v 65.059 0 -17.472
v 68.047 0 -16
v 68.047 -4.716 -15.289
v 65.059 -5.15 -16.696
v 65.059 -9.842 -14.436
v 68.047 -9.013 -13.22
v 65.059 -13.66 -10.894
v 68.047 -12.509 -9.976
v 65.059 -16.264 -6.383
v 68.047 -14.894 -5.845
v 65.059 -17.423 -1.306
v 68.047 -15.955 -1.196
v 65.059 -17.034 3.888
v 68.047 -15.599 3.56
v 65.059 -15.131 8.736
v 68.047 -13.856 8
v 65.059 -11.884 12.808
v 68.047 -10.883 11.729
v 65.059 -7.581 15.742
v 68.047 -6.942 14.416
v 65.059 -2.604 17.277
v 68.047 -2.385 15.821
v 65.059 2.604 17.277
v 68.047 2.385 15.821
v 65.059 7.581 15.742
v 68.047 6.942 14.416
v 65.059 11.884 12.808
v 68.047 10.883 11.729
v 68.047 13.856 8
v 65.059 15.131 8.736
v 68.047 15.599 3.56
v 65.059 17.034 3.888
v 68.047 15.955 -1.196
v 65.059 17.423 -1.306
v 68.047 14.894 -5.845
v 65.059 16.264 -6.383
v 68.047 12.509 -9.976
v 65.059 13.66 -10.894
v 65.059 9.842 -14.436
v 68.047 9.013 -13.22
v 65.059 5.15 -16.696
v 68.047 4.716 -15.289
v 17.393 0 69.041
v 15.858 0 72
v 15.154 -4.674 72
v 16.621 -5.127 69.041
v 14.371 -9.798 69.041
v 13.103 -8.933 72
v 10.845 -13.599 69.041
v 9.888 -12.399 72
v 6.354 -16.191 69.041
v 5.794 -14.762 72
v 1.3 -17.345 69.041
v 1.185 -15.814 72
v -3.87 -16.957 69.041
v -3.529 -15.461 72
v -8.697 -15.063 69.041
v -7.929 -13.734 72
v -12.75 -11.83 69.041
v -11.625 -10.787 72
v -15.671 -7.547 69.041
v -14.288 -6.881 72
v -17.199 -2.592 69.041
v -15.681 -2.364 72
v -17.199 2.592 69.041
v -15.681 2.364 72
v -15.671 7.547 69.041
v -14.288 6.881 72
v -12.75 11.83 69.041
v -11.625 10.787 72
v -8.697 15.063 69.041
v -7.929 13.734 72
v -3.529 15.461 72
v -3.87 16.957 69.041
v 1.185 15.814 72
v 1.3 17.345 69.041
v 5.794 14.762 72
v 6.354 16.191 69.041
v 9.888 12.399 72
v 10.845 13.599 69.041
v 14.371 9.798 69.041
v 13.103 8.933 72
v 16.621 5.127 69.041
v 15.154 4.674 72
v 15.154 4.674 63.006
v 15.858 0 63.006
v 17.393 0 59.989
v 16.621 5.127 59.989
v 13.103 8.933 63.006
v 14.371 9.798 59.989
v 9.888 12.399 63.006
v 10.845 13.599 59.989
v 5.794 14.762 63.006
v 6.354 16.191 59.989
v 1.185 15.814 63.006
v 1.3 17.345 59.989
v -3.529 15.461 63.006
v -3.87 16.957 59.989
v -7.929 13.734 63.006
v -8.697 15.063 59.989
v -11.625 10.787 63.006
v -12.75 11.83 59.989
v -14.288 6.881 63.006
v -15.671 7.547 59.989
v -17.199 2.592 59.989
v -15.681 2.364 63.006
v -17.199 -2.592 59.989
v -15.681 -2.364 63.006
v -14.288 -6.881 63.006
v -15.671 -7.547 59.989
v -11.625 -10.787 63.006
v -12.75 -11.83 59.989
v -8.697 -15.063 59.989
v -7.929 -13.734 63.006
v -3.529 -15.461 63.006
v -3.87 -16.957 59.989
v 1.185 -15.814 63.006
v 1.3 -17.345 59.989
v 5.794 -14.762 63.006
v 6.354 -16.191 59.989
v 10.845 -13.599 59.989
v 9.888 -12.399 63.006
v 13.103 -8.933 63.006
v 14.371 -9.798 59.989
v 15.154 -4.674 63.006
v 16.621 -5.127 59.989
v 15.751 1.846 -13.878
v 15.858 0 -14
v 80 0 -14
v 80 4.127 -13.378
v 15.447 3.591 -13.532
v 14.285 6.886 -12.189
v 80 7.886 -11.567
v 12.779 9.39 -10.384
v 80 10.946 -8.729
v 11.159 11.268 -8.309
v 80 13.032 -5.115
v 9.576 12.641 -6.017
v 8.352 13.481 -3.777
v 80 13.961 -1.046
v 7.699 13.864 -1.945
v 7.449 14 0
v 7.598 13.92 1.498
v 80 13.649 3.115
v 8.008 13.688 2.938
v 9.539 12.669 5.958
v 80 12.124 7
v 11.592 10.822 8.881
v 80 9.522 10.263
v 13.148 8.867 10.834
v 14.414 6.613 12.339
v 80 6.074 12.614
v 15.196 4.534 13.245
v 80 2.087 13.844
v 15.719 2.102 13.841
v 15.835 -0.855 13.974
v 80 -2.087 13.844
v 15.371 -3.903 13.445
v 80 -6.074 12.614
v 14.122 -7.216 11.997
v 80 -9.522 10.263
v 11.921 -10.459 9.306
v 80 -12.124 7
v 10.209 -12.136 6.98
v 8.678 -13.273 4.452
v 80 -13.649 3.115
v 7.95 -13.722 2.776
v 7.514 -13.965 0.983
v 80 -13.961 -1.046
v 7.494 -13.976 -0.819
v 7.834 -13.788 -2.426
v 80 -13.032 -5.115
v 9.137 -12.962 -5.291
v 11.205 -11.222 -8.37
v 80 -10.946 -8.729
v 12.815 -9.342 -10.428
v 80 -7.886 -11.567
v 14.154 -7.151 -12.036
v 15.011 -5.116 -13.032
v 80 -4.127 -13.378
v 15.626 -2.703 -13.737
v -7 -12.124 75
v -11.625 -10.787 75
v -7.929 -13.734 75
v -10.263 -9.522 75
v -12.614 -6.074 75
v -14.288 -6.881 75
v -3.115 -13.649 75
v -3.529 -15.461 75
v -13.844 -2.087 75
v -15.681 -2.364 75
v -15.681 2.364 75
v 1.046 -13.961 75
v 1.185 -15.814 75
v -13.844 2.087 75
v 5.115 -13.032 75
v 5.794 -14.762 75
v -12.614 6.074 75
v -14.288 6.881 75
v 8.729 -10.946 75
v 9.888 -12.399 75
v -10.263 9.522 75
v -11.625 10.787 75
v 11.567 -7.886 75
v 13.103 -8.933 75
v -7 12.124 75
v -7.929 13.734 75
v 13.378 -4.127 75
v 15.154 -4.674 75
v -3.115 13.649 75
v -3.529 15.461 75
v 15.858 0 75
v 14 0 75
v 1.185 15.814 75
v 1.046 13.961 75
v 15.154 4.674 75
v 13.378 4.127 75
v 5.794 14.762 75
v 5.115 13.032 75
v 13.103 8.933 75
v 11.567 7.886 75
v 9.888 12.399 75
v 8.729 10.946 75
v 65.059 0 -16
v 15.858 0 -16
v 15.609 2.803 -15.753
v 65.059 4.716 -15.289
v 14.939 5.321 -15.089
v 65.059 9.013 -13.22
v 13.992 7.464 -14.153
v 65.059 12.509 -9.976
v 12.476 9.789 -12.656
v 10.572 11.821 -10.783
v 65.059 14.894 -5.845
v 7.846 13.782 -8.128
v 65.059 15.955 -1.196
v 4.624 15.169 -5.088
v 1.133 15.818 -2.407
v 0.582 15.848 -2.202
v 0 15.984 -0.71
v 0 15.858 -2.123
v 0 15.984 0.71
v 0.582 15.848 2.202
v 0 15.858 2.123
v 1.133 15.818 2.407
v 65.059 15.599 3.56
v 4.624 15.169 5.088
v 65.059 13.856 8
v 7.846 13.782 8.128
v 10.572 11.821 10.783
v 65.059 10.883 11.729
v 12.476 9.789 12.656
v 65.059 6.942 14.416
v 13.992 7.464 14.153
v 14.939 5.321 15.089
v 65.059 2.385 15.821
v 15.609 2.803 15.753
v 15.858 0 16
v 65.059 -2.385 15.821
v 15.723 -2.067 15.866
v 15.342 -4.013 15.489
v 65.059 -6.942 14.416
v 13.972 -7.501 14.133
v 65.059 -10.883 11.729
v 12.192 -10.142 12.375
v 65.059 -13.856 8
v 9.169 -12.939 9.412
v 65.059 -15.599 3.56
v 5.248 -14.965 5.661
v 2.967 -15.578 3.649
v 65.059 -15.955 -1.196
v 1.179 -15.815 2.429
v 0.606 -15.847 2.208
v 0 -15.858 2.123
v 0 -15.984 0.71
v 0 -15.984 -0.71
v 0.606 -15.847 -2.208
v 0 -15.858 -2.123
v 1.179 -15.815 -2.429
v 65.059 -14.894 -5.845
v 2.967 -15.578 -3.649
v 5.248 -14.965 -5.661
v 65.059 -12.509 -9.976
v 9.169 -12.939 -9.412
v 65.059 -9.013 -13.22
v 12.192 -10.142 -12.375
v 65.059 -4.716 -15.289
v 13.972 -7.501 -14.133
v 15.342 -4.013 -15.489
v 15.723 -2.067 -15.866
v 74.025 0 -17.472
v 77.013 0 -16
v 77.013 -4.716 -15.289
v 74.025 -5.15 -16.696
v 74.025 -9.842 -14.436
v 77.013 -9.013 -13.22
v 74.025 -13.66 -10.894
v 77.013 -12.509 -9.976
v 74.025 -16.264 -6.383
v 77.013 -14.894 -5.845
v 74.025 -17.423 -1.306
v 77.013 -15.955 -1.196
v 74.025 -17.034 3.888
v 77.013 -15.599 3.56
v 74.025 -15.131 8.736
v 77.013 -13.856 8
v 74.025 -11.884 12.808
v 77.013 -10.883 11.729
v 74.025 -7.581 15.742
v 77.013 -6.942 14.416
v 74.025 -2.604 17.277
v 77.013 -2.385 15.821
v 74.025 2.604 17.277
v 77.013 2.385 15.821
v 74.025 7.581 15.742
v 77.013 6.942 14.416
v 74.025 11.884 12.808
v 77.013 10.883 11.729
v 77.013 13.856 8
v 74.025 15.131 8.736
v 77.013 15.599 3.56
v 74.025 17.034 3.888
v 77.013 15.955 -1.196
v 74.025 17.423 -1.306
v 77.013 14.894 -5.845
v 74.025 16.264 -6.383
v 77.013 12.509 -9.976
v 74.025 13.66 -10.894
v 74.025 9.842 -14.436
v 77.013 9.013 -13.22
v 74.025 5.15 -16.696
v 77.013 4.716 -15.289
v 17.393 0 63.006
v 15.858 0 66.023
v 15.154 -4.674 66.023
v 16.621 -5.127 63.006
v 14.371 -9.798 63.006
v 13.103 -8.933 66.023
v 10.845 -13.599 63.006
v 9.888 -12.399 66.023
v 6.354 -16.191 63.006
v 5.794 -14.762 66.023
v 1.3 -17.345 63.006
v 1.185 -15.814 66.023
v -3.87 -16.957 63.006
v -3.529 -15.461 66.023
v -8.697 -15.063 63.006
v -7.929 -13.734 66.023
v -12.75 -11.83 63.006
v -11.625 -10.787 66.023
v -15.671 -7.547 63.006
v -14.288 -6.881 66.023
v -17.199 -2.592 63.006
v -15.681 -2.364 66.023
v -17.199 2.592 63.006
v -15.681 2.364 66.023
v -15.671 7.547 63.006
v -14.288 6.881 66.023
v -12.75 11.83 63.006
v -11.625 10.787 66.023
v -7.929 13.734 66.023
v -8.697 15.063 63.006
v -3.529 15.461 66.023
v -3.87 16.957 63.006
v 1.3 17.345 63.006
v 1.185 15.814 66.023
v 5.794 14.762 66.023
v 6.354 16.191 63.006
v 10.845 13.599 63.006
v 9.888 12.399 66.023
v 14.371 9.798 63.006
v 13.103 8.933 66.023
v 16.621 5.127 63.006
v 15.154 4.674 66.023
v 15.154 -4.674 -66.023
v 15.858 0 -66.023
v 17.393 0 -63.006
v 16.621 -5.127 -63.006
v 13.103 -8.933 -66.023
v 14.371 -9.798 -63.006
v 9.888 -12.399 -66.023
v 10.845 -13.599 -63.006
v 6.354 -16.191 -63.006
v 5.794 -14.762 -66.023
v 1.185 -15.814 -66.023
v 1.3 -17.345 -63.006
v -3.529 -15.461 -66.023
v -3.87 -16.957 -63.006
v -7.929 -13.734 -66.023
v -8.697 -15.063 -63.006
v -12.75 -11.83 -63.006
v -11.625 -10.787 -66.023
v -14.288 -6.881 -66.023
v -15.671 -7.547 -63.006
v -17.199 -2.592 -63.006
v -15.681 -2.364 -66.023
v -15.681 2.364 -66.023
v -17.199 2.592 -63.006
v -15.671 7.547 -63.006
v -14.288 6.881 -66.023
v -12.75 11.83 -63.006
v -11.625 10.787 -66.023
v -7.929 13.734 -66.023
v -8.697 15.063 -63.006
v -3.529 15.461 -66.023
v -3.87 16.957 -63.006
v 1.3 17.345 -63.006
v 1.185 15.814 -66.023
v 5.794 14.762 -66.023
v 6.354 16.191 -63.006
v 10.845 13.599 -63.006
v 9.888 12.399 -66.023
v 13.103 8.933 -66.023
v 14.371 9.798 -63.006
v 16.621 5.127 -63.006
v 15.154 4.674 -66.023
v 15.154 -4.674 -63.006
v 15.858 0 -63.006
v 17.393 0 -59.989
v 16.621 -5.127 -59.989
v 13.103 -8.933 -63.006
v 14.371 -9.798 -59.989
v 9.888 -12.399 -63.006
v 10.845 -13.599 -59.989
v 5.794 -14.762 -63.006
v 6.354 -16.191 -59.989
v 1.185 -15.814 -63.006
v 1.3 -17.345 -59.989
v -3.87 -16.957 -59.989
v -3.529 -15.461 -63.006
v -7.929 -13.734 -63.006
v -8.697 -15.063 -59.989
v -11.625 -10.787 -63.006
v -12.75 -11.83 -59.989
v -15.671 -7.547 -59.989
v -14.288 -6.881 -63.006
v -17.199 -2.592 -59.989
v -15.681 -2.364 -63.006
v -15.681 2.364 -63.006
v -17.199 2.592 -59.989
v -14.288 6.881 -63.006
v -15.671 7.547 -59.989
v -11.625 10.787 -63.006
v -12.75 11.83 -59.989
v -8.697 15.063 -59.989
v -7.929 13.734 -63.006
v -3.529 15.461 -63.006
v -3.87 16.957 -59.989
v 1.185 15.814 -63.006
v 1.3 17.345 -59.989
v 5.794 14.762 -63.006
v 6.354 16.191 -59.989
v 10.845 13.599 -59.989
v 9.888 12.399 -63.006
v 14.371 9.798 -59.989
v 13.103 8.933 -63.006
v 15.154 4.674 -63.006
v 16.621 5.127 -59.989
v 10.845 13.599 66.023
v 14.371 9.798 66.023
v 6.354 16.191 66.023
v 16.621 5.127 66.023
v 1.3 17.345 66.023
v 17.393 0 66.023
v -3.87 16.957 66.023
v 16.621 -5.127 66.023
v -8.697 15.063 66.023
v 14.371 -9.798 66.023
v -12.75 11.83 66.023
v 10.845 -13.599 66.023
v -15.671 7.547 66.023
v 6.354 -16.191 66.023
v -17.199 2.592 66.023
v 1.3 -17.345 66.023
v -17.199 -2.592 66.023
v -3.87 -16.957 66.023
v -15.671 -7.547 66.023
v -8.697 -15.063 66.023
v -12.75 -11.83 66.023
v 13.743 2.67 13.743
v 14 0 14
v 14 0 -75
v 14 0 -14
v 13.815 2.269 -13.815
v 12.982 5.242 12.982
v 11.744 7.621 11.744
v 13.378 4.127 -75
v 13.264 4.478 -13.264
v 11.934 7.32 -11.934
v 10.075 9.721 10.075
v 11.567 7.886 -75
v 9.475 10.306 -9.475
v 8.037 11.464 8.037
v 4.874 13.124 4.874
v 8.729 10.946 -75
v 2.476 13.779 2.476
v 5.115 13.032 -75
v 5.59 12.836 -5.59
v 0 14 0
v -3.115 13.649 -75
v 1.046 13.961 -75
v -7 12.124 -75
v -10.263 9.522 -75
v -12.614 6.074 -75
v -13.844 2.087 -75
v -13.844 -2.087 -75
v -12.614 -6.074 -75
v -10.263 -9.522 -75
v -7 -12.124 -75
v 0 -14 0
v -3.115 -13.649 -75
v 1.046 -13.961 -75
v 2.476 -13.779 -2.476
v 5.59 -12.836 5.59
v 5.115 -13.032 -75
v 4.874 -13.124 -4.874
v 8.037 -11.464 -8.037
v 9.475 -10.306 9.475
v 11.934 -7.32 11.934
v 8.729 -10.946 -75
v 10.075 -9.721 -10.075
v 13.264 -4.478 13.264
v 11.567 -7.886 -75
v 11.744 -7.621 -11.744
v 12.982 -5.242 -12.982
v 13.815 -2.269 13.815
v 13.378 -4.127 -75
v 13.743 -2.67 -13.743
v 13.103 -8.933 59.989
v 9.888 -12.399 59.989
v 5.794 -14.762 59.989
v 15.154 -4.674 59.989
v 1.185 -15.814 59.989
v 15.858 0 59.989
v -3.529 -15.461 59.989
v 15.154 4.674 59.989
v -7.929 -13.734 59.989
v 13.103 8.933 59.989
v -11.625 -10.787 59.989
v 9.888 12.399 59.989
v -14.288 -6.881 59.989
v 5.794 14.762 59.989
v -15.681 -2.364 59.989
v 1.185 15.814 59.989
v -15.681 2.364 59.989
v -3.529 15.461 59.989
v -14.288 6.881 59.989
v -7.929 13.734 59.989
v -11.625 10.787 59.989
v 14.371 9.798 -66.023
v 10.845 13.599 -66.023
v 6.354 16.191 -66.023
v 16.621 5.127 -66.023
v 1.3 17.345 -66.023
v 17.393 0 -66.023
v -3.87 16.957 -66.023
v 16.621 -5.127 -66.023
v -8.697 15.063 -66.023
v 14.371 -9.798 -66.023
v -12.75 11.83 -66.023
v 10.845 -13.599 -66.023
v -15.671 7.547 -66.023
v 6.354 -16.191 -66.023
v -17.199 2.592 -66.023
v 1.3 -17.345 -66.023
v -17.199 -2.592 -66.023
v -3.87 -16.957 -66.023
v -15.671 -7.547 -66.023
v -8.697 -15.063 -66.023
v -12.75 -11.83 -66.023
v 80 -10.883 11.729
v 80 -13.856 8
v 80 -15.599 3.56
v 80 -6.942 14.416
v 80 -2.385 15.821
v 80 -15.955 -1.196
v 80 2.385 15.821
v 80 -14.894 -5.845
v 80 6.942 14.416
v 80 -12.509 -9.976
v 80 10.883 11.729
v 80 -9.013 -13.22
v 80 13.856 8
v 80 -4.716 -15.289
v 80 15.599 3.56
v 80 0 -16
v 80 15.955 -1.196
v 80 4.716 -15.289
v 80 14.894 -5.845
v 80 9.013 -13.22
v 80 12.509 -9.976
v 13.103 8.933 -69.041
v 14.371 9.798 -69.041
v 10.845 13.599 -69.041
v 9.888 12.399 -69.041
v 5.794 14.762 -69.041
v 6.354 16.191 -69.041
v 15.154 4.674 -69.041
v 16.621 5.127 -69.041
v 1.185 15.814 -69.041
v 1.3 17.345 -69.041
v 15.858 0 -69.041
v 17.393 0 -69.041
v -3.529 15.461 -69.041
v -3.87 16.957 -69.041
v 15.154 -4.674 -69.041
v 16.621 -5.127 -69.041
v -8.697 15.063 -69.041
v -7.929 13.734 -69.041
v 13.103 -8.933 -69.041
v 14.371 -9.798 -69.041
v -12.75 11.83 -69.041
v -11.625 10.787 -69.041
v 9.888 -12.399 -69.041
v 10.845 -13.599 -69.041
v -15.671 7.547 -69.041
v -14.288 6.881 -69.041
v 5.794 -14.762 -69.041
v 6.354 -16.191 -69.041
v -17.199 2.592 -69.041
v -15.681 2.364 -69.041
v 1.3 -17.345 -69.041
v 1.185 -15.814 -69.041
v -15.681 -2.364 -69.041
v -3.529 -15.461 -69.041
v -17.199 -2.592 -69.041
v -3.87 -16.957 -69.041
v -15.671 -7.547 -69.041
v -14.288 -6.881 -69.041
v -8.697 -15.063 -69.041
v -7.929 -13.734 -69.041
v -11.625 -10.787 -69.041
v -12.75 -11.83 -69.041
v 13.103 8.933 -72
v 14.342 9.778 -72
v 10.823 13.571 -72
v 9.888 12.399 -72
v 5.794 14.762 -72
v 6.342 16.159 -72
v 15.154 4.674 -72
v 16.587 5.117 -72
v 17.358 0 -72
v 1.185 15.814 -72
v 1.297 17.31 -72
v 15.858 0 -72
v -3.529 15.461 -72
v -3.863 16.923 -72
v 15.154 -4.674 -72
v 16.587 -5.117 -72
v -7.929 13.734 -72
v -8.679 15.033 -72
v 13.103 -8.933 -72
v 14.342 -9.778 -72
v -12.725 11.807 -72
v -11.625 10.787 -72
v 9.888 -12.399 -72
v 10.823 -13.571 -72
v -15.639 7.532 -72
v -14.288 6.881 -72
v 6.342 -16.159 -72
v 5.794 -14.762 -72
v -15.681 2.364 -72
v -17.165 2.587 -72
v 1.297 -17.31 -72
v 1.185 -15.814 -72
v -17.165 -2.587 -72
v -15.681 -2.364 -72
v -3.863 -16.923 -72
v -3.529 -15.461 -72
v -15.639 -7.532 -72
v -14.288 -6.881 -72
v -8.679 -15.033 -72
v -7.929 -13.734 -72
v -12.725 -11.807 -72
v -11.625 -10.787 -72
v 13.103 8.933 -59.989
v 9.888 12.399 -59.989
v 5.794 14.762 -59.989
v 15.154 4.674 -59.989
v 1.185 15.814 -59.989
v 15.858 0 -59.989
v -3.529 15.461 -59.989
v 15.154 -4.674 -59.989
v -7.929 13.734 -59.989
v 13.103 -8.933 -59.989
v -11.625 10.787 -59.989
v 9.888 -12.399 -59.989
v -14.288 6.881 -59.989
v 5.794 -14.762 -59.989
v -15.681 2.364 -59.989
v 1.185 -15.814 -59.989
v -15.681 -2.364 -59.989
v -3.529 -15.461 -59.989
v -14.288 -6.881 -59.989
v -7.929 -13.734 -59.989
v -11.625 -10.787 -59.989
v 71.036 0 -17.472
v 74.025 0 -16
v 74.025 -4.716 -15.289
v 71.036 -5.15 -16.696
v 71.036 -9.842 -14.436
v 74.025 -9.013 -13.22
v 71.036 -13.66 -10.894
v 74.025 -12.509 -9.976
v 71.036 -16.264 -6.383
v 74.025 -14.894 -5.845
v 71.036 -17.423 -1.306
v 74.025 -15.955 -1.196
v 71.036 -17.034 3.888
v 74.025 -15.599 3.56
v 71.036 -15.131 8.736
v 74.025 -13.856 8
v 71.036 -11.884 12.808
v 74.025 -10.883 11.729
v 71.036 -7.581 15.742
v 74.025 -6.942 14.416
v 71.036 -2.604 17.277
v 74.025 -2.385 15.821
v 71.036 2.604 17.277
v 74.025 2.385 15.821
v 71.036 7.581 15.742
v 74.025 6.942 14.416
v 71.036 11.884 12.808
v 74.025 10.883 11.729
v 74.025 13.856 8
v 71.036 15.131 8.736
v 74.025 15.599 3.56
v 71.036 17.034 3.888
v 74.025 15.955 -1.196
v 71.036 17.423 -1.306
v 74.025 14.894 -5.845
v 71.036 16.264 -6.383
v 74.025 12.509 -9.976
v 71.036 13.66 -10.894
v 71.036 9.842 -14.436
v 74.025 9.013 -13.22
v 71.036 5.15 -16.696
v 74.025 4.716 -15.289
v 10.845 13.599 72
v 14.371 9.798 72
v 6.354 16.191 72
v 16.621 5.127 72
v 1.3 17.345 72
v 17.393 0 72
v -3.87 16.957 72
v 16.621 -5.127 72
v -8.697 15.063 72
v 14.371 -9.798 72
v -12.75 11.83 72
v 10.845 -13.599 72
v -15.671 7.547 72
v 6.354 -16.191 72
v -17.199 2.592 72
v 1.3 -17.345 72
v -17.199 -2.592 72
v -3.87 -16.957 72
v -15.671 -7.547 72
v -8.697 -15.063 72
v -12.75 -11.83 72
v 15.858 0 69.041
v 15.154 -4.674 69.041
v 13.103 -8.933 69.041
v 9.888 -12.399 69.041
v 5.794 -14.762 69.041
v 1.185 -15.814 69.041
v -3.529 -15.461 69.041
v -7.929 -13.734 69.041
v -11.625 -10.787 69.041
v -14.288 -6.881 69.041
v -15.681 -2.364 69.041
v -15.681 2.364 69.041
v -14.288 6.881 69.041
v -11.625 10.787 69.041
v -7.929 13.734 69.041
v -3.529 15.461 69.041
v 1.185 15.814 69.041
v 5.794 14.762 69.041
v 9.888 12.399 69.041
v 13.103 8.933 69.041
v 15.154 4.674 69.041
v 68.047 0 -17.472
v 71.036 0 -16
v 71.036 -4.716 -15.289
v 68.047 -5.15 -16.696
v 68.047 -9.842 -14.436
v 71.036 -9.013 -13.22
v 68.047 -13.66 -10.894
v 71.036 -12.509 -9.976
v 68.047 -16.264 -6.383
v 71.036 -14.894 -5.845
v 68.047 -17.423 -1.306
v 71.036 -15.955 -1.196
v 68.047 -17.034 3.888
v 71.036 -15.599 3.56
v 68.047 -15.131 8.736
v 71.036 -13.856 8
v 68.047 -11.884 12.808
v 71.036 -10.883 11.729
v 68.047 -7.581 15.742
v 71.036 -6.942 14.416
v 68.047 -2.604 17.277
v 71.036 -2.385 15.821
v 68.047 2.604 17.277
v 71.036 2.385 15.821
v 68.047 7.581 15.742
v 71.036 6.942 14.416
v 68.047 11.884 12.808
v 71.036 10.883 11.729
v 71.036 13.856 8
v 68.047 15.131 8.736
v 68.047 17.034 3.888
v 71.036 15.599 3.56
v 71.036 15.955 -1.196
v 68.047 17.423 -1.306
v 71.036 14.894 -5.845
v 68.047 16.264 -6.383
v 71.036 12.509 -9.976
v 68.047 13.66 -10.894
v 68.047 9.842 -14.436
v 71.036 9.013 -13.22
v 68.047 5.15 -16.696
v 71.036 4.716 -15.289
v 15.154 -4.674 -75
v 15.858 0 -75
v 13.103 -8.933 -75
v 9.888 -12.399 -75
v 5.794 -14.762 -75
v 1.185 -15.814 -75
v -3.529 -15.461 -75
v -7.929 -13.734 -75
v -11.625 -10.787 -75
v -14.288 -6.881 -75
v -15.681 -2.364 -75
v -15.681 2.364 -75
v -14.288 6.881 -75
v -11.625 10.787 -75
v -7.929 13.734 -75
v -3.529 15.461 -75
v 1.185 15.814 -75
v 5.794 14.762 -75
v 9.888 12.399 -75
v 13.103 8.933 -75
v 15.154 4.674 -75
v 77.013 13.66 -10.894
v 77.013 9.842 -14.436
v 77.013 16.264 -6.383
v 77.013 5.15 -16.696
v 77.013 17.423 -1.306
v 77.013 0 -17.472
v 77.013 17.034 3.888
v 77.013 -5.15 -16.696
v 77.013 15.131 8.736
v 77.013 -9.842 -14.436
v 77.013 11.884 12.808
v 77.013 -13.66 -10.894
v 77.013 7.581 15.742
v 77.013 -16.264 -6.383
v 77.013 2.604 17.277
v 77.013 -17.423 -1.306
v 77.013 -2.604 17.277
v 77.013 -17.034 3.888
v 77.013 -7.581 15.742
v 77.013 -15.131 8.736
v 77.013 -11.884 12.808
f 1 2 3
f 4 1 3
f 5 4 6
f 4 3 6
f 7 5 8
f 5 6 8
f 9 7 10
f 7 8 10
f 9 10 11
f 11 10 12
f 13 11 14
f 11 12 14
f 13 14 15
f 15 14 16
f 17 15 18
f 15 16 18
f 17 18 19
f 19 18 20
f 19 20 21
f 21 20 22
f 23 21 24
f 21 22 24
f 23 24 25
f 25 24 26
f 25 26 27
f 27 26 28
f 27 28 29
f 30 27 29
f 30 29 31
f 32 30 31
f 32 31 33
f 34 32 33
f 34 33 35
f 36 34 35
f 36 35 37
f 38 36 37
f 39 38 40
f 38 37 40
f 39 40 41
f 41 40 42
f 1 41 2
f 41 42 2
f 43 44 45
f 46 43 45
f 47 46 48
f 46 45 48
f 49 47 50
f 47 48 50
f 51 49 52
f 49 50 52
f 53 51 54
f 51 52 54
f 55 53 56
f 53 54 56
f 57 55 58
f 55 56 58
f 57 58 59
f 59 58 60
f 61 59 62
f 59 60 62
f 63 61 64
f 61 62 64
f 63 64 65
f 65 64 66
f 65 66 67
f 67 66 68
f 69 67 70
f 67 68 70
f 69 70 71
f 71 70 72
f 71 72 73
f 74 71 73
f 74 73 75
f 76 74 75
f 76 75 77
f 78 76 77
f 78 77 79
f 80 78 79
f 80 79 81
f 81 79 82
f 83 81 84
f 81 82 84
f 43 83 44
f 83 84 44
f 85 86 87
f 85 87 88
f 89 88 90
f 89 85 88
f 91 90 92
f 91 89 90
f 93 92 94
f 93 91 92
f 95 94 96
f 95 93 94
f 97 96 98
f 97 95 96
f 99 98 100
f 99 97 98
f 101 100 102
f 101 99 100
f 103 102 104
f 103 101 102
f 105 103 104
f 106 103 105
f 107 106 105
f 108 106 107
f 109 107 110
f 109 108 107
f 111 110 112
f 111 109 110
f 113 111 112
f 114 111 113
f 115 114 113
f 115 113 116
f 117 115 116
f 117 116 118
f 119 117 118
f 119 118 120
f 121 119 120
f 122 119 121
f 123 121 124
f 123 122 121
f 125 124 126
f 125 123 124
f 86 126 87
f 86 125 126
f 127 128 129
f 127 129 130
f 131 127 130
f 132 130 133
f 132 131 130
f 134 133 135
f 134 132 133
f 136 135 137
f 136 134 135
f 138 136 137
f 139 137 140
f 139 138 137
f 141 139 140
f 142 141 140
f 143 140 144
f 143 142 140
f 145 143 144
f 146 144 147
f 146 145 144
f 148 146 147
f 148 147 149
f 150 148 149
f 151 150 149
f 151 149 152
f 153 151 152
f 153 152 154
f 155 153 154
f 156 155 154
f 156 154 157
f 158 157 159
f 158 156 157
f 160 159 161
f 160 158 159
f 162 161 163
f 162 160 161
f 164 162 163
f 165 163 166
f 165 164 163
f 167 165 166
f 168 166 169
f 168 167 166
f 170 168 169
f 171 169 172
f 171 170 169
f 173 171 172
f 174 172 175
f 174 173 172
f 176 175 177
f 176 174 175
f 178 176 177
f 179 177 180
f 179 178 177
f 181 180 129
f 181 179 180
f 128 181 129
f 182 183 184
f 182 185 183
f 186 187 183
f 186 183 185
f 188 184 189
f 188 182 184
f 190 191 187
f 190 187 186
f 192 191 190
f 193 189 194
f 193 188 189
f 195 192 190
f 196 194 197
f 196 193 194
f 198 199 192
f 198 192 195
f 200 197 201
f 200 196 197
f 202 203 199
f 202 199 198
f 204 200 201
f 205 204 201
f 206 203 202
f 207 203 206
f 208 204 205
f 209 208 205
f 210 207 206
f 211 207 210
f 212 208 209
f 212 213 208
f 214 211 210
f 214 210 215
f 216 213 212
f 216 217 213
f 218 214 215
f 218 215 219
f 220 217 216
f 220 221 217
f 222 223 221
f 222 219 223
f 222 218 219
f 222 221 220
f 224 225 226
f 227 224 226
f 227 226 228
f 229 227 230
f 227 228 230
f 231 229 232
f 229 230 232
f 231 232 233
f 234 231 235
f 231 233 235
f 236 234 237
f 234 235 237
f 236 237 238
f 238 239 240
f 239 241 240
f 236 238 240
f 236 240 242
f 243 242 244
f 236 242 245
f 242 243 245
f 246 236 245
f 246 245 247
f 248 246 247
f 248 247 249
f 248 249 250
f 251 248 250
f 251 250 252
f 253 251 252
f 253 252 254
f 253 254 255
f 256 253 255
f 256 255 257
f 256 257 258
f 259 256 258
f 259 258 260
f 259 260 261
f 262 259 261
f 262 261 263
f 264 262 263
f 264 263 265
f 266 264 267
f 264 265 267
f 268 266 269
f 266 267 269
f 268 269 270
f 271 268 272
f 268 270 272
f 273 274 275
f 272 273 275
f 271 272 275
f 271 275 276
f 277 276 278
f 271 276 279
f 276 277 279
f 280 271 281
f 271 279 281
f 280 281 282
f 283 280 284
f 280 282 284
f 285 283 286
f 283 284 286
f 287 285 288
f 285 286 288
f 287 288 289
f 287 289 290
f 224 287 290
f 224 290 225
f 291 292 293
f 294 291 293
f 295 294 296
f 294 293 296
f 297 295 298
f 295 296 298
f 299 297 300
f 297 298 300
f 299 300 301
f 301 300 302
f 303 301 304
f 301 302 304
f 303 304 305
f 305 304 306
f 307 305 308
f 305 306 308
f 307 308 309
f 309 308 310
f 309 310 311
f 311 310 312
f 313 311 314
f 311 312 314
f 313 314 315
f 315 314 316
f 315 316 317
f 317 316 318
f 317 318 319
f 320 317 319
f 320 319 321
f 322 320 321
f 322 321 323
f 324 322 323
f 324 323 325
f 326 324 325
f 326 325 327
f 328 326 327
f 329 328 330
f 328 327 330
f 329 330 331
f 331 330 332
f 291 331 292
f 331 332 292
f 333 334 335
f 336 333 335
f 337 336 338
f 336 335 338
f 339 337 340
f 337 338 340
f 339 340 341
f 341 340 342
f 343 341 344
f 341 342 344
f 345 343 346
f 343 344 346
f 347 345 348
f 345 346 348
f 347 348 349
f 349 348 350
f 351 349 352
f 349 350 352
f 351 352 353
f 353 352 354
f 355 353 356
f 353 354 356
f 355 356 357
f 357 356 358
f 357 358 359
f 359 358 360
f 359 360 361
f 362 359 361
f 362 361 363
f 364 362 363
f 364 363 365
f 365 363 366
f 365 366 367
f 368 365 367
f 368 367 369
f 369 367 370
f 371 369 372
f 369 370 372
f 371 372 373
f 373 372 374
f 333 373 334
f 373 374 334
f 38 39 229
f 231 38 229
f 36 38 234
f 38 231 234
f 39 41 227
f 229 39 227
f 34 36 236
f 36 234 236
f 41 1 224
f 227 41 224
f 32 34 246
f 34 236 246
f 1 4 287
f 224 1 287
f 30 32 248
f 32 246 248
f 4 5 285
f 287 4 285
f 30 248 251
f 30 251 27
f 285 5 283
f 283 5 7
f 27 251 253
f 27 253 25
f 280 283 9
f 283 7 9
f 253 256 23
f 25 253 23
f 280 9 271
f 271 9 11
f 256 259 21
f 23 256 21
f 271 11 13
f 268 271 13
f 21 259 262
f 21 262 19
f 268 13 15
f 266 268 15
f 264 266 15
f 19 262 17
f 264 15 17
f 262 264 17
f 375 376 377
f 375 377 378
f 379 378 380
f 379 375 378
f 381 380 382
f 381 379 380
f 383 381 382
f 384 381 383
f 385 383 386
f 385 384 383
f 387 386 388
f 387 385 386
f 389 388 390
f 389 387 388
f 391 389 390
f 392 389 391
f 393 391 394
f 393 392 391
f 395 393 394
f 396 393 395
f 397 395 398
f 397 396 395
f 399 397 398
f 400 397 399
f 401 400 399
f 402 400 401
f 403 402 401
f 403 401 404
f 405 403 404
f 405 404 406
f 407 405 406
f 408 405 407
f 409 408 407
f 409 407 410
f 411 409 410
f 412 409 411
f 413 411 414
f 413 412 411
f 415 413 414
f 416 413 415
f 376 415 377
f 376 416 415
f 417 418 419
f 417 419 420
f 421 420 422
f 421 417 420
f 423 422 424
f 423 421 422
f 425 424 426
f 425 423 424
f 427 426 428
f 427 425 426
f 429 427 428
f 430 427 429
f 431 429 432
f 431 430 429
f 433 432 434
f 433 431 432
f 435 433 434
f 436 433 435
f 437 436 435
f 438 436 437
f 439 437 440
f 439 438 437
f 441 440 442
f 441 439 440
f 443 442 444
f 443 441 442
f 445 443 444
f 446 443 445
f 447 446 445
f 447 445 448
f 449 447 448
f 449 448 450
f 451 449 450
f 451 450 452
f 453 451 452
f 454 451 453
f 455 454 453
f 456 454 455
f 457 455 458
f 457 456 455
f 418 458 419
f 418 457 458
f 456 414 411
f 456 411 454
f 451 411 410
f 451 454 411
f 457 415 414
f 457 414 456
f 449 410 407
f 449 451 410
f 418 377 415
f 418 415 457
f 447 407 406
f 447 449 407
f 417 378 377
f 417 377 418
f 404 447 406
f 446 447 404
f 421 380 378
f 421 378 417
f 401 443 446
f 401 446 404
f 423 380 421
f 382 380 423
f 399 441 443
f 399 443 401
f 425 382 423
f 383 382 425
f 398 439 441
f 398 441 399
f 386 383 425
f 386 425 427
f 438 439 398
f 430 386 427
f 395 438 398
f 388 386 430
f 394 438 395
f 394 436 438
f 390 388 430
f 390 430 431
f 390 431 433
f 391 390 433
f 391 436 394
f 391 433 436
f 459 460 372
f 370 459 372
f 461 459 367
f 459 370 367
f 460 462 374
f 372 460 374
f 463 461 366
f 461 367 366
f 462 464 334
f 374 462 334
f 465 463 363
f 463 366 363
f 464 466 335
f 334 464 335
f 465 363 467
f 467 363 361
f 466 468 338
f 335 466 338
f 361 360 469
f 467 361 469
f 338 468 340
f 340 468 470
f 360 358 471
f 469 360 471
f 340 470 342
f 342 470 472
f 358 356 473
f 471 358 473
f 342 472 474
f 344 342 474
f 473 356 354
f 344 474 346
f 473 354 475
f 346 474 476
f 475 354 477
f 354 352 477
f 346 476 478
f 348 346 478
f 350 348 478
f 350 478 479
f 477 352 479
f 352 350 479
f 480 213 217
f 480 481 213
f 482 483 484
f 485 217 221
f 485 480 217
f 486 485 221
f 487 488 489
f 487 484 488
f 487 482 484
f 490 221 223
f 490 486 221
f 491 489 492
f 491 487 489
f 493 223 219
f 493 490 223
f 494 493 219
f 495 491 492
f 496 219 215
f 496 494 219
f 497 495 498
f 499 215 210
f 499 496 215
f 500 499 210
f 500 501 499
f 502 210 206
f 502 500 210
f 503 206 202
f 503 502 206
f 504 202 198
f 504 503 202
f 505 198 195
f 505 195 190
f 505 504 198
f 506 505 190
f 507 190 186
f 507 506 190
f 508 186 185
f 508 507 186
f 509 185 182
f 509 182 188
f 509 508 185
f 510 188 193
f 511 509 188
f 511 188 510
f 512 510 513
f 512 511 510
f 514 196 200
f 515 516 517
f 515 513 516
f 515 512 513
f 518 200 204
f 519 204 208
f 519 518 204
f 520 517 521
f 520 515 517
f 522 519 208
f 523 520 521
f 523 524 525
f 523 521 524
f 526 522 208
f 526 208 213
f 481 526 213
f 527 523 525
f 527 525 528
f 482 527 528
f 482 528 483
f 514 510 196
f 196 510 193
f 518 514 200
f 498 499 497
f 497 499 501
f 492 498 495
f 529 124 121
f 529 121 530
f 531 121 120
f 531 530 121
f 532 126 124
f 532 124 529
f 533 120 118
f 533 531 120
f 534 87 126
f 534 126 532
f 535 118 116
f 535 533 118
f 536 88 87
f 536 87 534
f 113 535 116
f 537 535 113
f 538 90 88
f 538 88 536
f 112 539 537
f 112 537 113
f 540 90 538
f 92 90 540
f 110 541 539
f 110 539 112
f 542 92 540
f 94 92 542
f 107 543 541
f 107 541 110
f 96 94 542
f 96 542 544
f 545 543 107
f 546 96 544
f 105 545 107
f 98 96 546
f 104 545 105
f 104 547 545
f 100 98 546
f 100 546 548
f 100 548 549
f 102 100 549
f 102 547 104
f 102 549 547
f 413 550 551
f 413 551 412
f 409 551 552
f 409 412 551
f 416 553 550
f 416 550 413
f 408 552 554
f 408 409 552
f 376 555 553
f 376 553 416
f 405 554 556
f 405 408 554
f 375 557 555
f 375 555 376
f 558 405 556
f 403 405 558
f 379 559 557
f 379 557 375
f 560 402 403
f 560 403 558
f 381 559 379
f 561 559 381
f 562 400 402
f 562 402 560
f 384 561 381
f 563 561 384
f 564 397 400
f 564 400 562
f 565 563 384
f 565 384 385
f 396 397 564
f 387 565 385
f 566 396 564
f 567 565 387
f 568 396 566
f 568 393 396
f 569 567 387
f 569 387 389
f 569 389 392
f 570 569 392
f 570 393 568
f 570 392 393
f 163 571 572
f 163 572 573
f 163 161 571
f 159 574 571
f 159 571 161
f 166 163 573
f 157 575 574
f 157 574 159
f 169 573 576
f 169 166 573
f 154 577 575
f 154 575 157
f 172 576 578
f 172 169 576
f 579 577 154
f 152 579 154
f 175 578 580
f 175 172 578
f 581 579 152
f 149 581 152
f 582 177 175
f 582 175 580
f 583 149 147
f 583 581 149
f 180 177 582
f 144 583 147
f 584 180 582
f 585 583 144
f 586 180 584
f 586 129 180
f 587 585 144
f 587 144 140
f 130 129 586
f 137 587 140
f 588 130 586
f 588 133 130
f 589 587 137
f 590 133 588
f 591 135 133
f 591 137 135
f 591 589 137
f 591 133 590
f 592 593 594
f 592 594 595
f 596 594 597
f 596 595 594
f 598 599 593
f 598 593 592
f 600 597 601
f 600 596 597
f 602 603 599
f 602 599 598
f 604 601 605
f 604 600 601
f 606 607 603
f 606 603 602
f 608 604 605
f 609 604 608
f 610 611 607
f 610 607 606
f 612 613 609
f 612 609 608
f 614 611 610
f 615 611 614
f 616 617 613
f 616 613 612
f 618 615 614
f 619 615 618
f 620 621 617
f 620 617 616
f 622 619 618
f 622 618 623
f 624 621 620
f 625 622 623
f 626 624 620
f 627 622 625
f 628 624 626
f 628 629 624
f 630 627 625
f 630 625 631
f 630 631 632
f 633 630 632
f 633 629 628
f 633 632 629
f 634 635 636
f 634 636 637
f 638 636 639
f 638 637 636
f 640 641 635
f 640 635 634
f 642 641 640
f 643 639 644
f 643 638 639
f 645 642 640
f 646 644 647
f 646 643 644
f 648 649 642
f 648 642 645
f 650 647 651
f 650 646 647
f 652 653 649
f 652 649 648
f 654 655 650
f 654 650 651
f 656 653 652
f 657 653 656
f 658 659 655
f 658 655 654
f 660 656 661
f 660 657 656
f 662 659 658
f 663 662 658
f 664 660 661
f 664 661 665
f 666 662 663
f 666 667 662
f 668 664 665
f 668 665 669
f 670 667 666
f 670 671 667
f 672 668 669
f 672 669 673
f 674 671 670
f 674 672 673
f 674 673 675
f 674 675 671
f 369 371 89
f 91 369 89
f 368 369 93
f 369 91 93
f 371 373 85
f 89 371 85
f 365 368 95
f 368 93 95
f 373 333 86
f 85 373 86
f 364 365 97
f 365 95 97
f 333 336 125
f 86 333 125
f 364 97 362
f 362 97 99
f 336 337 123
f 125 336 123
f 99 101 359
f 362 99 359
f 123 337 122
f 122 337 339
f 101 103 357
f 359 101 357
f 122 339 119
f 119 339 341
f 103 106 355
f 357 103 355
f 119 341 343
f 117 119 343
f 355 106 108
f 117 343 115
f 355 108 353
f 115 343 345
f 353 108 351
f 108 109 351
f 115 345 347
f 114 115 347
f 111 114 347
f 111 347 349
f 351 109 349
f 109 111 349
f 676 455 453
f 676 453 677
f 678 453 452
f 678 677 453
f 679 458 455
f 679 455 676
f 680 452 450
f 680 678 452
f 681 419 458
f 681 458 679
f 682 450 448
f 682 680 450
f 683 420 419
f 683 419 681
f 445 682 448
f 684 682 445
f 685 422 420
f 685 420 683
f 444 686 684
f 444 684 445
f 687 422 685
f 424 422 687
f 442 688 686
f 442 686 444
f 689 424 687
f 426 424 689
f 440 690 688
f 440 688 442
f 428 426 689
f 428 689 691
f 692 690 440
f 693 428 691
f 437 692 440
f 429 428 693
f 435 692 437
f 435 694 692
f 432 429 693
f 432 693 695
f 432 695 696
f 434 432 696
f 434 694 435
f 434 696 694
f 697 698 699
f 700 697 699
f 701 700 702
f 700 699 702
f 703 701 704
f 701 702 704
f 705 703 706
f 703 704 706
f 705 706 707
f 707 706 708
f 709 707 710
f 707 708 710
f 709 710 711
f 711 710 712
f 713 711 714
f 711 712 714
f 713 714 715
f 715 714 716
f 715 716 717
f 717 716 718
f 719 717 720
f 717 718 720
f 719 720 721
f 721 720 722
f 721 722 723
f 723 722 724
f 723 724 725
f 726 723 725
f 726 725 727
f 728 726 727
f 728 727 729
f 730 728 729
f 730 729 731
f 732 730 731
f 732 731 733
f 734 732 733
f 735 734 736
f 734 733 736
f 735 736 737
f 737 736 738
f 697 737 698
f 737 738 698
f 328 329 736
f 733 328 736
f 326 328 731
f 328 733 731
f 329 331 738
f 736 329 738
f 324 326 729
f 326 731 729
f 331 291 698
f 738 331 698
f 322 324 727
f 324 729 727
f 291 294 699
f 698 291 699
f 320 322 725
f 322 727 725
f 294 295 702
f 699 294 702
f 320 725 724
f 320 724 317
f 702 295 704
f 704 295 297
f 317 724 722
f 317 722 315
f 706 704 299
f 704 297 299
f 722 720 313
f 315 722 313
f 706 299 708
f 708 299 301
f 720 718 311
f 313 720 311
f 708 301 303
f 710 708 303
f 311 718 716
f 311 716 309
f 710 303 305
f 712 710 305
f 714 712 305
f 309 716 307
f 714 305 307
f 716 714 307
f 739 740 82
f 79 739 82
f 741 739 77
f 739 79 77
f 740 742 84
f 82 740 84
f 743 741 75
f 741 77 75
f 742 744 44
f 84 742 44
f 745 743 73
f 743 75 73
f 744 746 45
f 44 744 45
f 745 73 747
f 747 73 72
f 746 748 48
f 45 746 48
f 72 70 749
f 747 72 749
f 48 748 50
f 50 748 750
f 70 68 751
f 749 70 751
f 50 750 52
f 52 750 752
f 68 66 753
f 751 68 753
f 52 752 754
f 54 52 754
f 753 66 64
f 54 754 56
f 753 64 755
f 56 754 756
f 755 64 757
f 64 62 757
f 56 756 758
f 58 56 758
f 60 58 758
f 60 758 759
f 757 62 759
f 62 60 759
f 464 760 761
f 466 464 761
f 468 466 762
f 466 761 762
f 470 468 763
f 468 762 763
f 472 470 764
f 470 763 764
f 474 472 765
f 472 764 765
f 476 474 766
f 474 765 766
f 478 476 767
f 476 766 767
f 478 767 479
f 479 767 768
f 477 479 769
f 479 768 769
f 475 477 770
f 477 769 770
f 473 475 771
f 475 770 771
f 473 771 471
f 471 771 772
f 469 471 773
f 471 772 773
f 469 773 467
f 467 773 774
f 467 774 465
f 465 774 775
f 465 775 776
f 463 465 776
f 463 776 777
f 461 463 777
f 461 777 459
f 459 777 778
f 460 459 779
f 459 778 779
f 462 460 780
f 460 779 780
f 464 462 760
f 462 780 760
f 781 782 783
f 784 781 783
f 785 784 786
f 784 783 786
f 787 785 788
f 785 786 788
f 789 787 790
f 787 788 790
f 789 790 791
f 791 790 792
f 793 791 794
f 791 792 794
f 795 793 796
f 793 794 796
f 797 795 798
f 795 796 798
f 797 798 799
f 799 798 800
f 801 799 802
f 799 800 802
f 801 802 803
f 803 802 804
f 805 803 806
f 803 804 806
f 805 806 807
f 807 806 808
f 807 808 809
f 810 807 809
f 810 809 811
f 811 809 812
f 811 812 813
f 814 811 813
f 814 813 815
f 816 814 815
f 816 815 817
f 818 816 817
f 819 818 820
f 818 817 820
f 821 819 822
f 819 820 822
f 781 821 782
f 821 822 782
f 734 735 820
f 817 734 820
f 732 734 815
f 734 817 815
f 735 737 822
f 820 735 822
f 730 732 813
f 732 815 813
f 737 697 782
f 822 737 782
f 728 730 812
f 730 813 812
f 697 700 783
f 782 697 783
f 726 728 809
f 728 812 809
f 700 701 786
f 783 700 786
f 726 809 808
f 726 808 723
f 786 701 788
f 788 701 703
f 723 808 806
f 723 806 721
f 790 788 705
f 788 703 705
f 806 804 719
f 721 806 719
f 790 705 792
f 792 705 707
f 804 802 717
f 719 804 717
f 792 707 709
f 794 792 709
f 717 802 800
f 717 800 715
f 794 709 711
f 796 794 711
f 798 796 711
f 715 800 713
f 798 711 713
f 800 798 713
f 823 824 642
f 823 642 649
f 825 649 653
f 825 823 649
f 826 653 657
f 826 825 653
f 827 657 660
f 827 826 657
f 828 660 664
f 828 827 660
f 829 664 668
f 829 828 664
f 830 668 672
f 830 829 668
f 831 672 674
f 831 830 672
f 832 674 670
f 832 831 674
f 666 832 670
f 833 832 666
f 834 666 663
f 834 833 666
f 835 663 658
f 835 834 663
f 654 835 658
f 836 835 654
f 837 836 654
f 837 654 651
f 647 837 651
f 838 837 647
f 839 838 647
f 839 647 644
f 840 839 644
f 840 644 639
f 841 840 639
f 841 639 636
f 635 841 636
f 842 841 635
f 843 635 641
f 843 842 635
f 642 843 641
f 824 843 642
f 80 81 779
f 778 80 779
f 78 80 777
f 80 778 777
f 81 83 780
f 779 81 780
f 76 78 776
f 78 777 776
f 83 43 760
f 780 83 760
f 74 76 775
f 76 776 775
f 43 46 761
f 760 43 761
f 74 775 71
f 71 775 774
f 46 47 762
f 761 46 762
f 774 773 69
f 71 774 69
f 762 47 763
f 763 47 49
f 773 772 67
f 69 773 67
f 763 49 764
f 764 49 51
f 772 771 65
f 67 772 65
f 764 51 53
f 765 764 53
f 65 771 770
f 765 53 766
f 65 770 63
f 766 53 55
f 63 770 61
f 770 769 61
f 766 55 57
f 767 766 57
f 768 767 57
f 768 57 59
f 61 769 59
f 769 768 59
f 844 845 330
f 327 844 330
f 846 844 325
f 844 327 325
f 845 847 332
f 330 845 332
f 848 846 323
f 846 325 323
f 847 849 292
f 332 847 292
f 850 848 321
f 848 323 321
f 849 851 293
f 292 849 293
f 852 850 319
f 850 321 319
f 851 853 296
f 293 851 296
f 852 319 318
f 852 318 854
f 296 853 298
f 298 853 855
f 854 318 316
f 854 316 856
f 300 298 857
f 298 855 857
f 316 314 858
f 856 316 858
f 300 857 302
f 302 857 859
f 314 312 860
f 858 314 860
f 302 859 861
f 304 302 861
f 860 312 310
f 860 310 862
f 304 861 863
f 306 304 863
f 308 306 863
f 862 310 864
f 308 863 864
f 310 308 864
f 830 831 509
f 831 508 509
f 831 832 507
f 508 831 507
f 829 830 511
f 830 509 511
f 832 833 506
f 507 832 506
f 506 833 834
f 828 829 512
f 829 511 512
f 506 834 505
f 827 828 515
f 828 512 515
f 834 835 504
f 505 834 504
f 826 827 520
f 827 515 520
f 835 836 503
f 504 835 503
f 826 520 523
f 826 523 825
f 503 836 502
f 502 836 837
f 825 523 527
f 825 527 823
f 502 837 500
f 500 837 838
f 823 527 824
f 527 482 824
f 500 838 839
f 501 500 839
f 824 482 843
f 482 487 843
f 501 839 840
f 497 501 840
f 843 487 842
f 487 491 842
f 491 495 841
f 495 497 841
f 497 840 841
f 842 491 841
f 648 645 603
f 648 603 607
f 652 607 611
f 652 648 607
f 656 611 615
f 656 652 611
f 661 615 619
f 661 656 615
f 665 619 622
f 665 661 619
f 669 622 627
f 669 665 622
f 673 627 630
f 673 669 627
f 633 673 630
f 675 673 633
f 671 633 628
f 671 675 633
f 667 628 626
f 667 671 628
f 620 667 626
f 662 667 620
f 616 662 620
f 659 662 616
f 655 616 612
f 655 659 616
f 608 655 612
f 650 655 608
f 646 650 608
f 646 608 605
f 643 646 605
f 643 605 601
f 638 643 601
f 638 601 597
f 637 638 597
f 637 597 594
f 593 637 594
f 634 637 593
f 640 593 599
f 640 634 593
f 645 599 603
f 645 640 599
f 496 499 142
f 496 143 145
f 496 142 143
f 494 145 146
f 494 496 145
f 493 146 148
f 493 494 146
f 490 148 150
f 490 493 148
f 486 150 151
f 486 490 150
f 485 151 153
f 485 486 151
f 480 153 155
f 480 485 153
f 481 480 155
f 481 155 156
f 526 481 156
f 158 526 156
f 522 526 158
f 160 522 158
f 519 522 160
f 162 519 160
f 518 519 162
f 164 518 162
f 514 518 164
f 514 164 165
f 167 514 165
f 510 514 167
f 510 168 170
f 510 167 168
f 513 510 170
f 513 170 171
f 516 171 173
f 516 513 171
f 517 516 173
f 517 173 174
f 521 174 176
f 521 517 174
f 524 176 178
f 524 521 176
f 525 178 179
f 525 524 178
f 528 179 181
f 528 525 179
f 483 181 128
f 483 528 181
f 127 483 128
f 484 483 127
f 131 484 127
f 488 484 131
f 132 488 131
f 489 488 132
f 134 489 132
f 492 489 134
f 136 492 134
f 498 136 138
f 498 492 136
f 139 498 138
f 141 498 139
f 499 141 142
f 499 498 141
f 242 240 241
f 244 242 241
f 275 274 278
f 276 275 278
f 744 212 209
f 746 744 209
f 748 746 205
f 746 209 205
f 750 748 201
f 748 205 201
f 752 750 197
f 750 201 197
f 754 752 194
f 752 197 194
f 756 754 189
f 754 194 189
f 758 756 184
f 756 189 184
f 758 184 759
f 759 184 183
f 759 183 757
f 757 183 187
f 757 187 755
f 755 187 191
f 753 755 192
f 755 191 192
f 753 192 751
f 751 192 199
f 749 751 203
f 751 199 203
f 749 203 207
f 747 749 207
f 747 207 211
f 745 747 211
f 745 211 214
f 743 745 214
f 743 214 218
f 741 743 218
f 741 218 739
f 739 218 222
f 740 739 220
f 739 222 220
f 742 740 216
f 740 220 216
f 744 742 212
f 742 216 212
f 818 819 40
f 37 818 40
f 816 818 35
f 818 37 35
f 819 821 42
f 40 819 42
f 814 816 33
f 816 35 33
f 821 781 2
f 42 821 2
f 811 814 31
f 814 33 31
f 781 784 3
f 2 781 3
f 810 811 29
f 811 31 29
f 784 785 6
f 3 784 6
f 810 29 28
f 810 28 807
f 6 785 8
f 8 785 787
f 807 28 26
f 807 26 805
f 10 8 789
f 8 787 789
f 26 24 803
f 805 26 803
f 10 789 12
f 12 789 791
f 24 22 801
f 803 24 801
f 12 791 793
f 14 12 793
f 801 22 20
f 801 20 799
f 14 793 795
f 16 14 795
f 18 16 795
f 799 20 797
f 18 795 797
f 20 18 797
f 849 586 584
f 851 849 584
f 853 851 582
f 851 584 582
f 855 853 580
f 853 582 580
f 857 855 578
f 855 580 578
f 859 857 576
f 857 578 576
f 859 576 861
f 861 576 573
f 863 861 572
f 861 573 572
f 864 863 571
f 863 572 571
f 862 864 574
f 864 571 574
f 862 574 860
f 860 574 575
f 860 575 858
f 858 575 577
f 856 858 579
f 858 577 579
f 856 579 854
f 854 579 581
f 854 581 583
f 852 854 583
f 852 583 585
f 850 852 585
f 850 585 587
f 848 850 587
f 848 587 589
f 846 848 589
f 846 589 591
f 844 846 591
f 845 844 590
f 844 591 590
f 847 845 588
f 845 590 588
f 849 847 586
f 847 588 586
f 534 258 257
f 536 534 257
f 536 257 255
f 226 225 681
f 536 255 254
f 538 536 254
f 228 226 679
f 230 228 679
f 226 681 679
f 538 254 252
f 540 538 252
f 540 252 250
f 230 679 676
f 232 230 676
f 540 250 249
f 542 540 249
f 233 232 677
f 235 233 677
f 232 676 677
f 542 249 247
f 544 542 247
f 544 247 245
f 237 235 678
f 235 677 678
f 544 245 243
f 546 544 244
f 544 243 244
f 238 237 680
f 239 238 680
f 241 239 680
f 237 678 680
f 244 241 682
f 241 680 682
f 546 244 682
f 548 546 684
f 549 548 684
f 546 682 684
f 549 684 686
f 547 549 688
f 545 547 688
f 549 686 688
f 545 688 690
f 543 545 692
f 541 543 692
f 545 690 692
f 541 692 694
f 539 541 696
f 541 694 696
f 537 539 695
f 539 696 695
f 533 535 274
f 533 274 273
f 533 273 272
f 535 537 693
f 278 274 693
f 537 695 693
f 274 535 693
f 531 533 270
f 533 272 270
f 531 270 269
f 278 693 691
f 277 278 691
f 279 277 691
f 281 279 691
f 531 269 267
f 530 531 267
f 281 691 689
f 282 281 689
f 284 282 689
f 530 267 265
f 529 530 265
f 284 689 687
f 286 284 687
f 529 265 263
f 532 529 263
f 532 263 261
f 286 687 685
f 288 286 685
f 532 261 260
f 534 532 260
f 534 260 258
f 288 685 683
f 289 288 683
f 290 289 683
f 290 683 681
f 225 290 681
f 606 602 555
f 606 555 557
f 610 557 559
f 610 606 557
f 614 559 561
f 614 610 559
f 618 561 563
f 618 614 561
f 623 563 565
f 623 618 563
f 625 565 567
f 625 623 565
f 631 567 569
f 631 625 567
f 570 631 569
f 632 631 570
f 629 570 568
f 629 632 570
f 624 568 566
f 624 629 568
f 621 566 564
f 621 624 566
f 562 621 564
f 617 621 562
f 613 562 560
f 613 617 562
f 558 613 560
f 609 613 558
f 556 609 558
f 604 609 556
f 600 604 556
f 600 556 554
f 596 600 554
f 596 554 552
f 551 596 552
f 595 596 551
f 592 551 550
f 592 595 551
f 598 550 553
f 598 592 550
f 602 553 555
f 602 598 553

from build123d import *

# Parameters (mm, degrees)
BOSS_EXTRUDE1_DEPTH      = 75
BOSS_EXTRUDE1_DEPTH_BACK = 75
SKETCH1_R                = 15.858479127
SKETCH1_R_2              = 14
SKETCH12_R               = 16
SKETCH12_R_2             = 14
BOSS_EXTRUDE2_DEPTH      = 80
SKETCH13_R               = 14
CUT_EXTRUDE1_DEPTH       = 81
CUT_EXTRUDE2_DEPTH       = 90
CUT_EXTRUDE2_DEPTH_BACK  = 95
SKETCH15_R               = 14


with BuildPart() as part:
    # Sketch1 → Boss-Extrude1 (new, two sides: drawn at the far end of the back side and taken through both)
    with BuildSketch(Plane.XY.offset(-BOSS_EXTRUDE1_DEPTH_BACK)):
        Circle(SKETCH1_R)
        Circle(SKETCH1_R_2, mode=Mode.SUBTRACT)
    extrude(amount=BOSS_EXTRUDE1_DEPTH + BOSS_EXTRUDE1_DEPTH_BACK)

    # Sketch2 → Revolve1 (revolve)
    with BuildSketch(Plane(origin=(0, 0, 0), x_dir=(0, 0, -1), z_dir=(1, 0, 0)), mode=Mode.PRIVATE) as revolve1_sk:
        Polygon((75, 15.858479127), (72, 15.858479127), (72, 17.358479127), align=None)
    revolve(revolve1_sk.sketch.rotate(Axis((0, 0, 0), (0, 0, -1)), 90), axis=Axis((0, 0, 0), (0, 0, -1)))

    # Sketch3 → Revolve2 (revolve)
    with BuildSketch(Plane(origin=(0, 0, 0), x_dir=(0, 0, -1), z_dir=(1, 0, 0)), mode=Mode.PRIVATE) as revolve2_sk:
        Polygon((72, 15.858479127), (69.040504624, 15.858479127), (69.040504624, 17.393237669), align=None)
    revolve(revolve2_sk.sketch.rotate(Axis((0, 0, 0), (0, 0, -1)), 90), axis=Axis((0, 0, 0), (0, 0, -1)))

    # Sketch4 → Revolve3 (revolve)
    with BuildSketch(Plane(origin=(0, 0, 0), x_dir=(0, 0, -1), z_dir=(1, 0, 0)), mode=Mode.PRIVATE) as revolve3_sk:
        Polygon((69.040504624, 15.858479127), (66.023310335, 15.858479127), (66.023310335, 17.393237669), align=None)
    revolve(revolve3_sk.sketch.rotate(Axis((0, 0, 0), (0, 0, -1)), 90), axis=Axis((0, 0, 0), (0, 0, -1)))

    # Sketch5 → Revolve4 (revolve)
    with BuildSketch(Plane(origin=(0, 0, 0), x_dir=(0, 0, -1), z_dir=(1, 0, 0)), mode=Mode.PRIVATE) as revolve4_sk:
        Polygon((66.023310335, 15.858479127), (63.006116045, 15.858479127), (63.006116045, 17.393237669), align=None)
    revolve(revolve4_sk.sketch.rotate(Axis((0, 0, 0), (0, 0, -1)), 90), axis=Axis((0, 0, 0), (0, 0, -1)))

    # Sketch6 → Revolve5 (revolve)
    with BuildSketch(Plane(origin=(0, 0, 0), x_dir=(0, 0, -1), z_dir=(1, 0, 0)), mode=Mode.PRIVATE) as revolve5_sk:
        Polygon((63.006116045, 15.858479127), (59.988921756, 15.858479127), (59.988921756, 17.393237669), align=None)
    revolve(revolve5_sk.sketch.rotate(Axis((0, 0, 0), (0, 0, -1)), 90), axis=Axis((0, 0, 0), (0, 0, -1)))

    # Sketch7 → Revolve6 (revolve)
    with BuildSketch(Plane(origin=(0, 0, 0), x_dir=(0, 0, -1), z_dir=(1, 0, 0)), mode=Mode.PRIVATE) as revolve6_sk:
        Polygon((-75, 15.858479127), (-72, 15.858479127), (-72, 17.393237669), align=None)
    revolve(revolve6_sk.sketch.rotate(Axis((0, 0, 0), (0, 0, -1)), 90), axis=Axis((0, 0, 0), (0, 0, -1)))

    # Sketch8 → Revolve7 (revolve)
    with BuildSketch(Plane(origin=(0, 0, 0), x_dir=(0, 0, -1), z_dir=(1, 0, 0)), mode=Mode.PRIVATE) as revolve7_sk:
        Polygon((-72, 15.858479127), (-69.040504624, 15.858479127), (-69.040504624, 17.393237669), align=None)
    revolve(revolve7_sk.sketch.rotate(Axis((0, 0, 0), (0, 0, -1)), 90), axis=Axis((0, 0, 0), (0, 0, -1)))

    # Sketch9 → Revolve8 (revolve)
    with BuildSketch(Plane(origin=(0, 0, 0), x_dir=(0, 0, -1), z_dir=(1, 0, 0)), mode=Mode.PRIVATE) as revolve8_sk:
        Polygon((-69.040504624, 15.858479127), (-66.023310335, 15.858479127), (-66.023310335, 17.393237669), align=None)
    revolve(revolve8_sk.sketch.rotate(Axis((0, 0, 0), (0, 0, -1)), 90), axis=Axis((0, 0, 0), (0, 0, -1)))

    # Sketch10 → Revolve9 (revolve)
    with BuildSketch(Plane(origin=(0, 0, 0), x_dir=(0, 0, -1), z_dir=(1, 0, 0)), mode=Mode.PRIVATE) as revolve9_sk:
        Polygon((-66.023310335, 15.858479127), (-63.006116045, 15.858479127), (-63.006116045, 17.393237669), align=None)
    revolve(revolve9_sk.sketch.rotate(Axis((0, 0, 0), (0, 0, -1)), 90), axis=Axis((0, 0, 0), (0, 0, -1)))

    # Sketch11 → Revolve10 (revolve)
    with BuildSketch(Plane(origin=(0, 0, 0), x_dir=(0, 0, -1), z_dir=(1, 0, 0)), mode=Mode.PRIVATE) as revolve10_sk:
        Polygon((-63.006116045, 15.858479127), (-59.988921756, 15.858479127), (-59.988921756, 17.393237669), align=None)
    revolve(revolve10_sk.sketch.rotate(Axis((0, 0, 0), (0, 0, 1)), 270), axis=Axis((0, 0, 0), (0, 0, 1)))

    # Sketch12 → Boss-Extrude2 (add)
    with BuildSketch(Plane(origin=(0, 0, 0), x_dir=(0, 0, -1), z_dir=(1, 0, 0))):
        Circle(SKETCH12_R)
        Circle(SKETCH12_R_2, mode=Mode.SUBTRACT)
    extrude(amount=BOSS_EXTRUDE2_DEPTH)

    # Sketch13 → Cut-Extrude1 (cut)
    with BuildSketch(Plane(origin=(0, 0, 0), x_dir=(0, 0, -1), z_dir=(1, 0, 0))):
        with Locations(Location((0, 0, 0), (0, 0, 90))):
            Circle(SKETCH13_R)
    extrude(amount=CUT_EXTRUDE1_DEPTH, mode=Mode.SUBTRACT)

    # Sketch15 → Cut-Extrude2 (cut, two sides: drawn at the far end of the back side and taken through both)
    with BuildSketch(Plane.XY.offset(-CUT_EXTRUDE2_DEPTH_BACK)):
        Circle(SKETCH15_R)
    extrude(amount=CUT_EXTRUDE2_DEPTH + CUT_EXTRUDE2_DEPTH_BACK, mode=Mode.SUBTRACT)

    # Sketch16 → Revolve11 (revolve)
    with BuildSketch(Plane.XY, mode=Mode.PRIVATE) as revolve11_sk:
        Polygon((80, 16), (77.013377654, 16), (77.013377654, 17.472012137), align=None)
    revolve(revolve11_sk.sketch.rotate(Axis((0, 0, 0), (-1, 0, 0)), 90), axis=Axis((0, 0, 0), (-1, 0, 0)))

    # Sketch17 → Revolve12 (revolve)
    with BuildSketch(Plane.XY, mode=Mode.PRIVATE) as revolve12_sk:
        Polygon((77.013377654, 16), (74.024743999, 16), (74.024743999, 17.472012137), align=None)
    revolve(revolve12_sk.sketch.rotate(Axis((0, 0, 0), (-1, 0, 0)), 90), axis=Axis((0, 0, 0), (-1, 0, 0)))

    # Sketch18 → Revolve13 (revolve)
    with BuildSketch(Plane.XY, mode=Mode.PRIVATE) as revolve13_sk:
        Polygon((74.024743999, 16), (71.036110344, 16), (71.036110344, 17.472012137), align=None)
    revolve(revolve13_sk.sketch.rotate(Axis((0, 0, 0), (-1, 0, 0)), 90), axis=Axis((0, 0, 0), (-1, 0, 0)))

    # Sketch19 → Revolve14 (revolve)
    with BuildSketch(Plane.XY, mode=Mode.PRIVATE) as revolve14_sk:
        Polygon((71.036110344, 16), (68.047476689, 16), (68.047476689, 17.472012137), align=None)
    revolve(revolve14_sk.sketch.rotate(Axis((0, 0, 0), (-1, 0, 0)), 90), axis=Axis((0, 0, 0), (-1, 0, 0)))

    # Sketch20 → Revolve15 (revolve)
    with BuildSketch(Plane.XY, mode=Mode.PRIVATE) as revolve15_sk:
        Polygon((68.047476689, 16), (65.058843034, 16), (65.058843034, 17.472012137), align=None)
    revolve(revolve15_sk.sketch.rotate(Axis((0, 0, 0), (-1, 0, 0)), 90), axis=Axis((0, 0, 0), (-1, 0, 0)))


solid = part.part
